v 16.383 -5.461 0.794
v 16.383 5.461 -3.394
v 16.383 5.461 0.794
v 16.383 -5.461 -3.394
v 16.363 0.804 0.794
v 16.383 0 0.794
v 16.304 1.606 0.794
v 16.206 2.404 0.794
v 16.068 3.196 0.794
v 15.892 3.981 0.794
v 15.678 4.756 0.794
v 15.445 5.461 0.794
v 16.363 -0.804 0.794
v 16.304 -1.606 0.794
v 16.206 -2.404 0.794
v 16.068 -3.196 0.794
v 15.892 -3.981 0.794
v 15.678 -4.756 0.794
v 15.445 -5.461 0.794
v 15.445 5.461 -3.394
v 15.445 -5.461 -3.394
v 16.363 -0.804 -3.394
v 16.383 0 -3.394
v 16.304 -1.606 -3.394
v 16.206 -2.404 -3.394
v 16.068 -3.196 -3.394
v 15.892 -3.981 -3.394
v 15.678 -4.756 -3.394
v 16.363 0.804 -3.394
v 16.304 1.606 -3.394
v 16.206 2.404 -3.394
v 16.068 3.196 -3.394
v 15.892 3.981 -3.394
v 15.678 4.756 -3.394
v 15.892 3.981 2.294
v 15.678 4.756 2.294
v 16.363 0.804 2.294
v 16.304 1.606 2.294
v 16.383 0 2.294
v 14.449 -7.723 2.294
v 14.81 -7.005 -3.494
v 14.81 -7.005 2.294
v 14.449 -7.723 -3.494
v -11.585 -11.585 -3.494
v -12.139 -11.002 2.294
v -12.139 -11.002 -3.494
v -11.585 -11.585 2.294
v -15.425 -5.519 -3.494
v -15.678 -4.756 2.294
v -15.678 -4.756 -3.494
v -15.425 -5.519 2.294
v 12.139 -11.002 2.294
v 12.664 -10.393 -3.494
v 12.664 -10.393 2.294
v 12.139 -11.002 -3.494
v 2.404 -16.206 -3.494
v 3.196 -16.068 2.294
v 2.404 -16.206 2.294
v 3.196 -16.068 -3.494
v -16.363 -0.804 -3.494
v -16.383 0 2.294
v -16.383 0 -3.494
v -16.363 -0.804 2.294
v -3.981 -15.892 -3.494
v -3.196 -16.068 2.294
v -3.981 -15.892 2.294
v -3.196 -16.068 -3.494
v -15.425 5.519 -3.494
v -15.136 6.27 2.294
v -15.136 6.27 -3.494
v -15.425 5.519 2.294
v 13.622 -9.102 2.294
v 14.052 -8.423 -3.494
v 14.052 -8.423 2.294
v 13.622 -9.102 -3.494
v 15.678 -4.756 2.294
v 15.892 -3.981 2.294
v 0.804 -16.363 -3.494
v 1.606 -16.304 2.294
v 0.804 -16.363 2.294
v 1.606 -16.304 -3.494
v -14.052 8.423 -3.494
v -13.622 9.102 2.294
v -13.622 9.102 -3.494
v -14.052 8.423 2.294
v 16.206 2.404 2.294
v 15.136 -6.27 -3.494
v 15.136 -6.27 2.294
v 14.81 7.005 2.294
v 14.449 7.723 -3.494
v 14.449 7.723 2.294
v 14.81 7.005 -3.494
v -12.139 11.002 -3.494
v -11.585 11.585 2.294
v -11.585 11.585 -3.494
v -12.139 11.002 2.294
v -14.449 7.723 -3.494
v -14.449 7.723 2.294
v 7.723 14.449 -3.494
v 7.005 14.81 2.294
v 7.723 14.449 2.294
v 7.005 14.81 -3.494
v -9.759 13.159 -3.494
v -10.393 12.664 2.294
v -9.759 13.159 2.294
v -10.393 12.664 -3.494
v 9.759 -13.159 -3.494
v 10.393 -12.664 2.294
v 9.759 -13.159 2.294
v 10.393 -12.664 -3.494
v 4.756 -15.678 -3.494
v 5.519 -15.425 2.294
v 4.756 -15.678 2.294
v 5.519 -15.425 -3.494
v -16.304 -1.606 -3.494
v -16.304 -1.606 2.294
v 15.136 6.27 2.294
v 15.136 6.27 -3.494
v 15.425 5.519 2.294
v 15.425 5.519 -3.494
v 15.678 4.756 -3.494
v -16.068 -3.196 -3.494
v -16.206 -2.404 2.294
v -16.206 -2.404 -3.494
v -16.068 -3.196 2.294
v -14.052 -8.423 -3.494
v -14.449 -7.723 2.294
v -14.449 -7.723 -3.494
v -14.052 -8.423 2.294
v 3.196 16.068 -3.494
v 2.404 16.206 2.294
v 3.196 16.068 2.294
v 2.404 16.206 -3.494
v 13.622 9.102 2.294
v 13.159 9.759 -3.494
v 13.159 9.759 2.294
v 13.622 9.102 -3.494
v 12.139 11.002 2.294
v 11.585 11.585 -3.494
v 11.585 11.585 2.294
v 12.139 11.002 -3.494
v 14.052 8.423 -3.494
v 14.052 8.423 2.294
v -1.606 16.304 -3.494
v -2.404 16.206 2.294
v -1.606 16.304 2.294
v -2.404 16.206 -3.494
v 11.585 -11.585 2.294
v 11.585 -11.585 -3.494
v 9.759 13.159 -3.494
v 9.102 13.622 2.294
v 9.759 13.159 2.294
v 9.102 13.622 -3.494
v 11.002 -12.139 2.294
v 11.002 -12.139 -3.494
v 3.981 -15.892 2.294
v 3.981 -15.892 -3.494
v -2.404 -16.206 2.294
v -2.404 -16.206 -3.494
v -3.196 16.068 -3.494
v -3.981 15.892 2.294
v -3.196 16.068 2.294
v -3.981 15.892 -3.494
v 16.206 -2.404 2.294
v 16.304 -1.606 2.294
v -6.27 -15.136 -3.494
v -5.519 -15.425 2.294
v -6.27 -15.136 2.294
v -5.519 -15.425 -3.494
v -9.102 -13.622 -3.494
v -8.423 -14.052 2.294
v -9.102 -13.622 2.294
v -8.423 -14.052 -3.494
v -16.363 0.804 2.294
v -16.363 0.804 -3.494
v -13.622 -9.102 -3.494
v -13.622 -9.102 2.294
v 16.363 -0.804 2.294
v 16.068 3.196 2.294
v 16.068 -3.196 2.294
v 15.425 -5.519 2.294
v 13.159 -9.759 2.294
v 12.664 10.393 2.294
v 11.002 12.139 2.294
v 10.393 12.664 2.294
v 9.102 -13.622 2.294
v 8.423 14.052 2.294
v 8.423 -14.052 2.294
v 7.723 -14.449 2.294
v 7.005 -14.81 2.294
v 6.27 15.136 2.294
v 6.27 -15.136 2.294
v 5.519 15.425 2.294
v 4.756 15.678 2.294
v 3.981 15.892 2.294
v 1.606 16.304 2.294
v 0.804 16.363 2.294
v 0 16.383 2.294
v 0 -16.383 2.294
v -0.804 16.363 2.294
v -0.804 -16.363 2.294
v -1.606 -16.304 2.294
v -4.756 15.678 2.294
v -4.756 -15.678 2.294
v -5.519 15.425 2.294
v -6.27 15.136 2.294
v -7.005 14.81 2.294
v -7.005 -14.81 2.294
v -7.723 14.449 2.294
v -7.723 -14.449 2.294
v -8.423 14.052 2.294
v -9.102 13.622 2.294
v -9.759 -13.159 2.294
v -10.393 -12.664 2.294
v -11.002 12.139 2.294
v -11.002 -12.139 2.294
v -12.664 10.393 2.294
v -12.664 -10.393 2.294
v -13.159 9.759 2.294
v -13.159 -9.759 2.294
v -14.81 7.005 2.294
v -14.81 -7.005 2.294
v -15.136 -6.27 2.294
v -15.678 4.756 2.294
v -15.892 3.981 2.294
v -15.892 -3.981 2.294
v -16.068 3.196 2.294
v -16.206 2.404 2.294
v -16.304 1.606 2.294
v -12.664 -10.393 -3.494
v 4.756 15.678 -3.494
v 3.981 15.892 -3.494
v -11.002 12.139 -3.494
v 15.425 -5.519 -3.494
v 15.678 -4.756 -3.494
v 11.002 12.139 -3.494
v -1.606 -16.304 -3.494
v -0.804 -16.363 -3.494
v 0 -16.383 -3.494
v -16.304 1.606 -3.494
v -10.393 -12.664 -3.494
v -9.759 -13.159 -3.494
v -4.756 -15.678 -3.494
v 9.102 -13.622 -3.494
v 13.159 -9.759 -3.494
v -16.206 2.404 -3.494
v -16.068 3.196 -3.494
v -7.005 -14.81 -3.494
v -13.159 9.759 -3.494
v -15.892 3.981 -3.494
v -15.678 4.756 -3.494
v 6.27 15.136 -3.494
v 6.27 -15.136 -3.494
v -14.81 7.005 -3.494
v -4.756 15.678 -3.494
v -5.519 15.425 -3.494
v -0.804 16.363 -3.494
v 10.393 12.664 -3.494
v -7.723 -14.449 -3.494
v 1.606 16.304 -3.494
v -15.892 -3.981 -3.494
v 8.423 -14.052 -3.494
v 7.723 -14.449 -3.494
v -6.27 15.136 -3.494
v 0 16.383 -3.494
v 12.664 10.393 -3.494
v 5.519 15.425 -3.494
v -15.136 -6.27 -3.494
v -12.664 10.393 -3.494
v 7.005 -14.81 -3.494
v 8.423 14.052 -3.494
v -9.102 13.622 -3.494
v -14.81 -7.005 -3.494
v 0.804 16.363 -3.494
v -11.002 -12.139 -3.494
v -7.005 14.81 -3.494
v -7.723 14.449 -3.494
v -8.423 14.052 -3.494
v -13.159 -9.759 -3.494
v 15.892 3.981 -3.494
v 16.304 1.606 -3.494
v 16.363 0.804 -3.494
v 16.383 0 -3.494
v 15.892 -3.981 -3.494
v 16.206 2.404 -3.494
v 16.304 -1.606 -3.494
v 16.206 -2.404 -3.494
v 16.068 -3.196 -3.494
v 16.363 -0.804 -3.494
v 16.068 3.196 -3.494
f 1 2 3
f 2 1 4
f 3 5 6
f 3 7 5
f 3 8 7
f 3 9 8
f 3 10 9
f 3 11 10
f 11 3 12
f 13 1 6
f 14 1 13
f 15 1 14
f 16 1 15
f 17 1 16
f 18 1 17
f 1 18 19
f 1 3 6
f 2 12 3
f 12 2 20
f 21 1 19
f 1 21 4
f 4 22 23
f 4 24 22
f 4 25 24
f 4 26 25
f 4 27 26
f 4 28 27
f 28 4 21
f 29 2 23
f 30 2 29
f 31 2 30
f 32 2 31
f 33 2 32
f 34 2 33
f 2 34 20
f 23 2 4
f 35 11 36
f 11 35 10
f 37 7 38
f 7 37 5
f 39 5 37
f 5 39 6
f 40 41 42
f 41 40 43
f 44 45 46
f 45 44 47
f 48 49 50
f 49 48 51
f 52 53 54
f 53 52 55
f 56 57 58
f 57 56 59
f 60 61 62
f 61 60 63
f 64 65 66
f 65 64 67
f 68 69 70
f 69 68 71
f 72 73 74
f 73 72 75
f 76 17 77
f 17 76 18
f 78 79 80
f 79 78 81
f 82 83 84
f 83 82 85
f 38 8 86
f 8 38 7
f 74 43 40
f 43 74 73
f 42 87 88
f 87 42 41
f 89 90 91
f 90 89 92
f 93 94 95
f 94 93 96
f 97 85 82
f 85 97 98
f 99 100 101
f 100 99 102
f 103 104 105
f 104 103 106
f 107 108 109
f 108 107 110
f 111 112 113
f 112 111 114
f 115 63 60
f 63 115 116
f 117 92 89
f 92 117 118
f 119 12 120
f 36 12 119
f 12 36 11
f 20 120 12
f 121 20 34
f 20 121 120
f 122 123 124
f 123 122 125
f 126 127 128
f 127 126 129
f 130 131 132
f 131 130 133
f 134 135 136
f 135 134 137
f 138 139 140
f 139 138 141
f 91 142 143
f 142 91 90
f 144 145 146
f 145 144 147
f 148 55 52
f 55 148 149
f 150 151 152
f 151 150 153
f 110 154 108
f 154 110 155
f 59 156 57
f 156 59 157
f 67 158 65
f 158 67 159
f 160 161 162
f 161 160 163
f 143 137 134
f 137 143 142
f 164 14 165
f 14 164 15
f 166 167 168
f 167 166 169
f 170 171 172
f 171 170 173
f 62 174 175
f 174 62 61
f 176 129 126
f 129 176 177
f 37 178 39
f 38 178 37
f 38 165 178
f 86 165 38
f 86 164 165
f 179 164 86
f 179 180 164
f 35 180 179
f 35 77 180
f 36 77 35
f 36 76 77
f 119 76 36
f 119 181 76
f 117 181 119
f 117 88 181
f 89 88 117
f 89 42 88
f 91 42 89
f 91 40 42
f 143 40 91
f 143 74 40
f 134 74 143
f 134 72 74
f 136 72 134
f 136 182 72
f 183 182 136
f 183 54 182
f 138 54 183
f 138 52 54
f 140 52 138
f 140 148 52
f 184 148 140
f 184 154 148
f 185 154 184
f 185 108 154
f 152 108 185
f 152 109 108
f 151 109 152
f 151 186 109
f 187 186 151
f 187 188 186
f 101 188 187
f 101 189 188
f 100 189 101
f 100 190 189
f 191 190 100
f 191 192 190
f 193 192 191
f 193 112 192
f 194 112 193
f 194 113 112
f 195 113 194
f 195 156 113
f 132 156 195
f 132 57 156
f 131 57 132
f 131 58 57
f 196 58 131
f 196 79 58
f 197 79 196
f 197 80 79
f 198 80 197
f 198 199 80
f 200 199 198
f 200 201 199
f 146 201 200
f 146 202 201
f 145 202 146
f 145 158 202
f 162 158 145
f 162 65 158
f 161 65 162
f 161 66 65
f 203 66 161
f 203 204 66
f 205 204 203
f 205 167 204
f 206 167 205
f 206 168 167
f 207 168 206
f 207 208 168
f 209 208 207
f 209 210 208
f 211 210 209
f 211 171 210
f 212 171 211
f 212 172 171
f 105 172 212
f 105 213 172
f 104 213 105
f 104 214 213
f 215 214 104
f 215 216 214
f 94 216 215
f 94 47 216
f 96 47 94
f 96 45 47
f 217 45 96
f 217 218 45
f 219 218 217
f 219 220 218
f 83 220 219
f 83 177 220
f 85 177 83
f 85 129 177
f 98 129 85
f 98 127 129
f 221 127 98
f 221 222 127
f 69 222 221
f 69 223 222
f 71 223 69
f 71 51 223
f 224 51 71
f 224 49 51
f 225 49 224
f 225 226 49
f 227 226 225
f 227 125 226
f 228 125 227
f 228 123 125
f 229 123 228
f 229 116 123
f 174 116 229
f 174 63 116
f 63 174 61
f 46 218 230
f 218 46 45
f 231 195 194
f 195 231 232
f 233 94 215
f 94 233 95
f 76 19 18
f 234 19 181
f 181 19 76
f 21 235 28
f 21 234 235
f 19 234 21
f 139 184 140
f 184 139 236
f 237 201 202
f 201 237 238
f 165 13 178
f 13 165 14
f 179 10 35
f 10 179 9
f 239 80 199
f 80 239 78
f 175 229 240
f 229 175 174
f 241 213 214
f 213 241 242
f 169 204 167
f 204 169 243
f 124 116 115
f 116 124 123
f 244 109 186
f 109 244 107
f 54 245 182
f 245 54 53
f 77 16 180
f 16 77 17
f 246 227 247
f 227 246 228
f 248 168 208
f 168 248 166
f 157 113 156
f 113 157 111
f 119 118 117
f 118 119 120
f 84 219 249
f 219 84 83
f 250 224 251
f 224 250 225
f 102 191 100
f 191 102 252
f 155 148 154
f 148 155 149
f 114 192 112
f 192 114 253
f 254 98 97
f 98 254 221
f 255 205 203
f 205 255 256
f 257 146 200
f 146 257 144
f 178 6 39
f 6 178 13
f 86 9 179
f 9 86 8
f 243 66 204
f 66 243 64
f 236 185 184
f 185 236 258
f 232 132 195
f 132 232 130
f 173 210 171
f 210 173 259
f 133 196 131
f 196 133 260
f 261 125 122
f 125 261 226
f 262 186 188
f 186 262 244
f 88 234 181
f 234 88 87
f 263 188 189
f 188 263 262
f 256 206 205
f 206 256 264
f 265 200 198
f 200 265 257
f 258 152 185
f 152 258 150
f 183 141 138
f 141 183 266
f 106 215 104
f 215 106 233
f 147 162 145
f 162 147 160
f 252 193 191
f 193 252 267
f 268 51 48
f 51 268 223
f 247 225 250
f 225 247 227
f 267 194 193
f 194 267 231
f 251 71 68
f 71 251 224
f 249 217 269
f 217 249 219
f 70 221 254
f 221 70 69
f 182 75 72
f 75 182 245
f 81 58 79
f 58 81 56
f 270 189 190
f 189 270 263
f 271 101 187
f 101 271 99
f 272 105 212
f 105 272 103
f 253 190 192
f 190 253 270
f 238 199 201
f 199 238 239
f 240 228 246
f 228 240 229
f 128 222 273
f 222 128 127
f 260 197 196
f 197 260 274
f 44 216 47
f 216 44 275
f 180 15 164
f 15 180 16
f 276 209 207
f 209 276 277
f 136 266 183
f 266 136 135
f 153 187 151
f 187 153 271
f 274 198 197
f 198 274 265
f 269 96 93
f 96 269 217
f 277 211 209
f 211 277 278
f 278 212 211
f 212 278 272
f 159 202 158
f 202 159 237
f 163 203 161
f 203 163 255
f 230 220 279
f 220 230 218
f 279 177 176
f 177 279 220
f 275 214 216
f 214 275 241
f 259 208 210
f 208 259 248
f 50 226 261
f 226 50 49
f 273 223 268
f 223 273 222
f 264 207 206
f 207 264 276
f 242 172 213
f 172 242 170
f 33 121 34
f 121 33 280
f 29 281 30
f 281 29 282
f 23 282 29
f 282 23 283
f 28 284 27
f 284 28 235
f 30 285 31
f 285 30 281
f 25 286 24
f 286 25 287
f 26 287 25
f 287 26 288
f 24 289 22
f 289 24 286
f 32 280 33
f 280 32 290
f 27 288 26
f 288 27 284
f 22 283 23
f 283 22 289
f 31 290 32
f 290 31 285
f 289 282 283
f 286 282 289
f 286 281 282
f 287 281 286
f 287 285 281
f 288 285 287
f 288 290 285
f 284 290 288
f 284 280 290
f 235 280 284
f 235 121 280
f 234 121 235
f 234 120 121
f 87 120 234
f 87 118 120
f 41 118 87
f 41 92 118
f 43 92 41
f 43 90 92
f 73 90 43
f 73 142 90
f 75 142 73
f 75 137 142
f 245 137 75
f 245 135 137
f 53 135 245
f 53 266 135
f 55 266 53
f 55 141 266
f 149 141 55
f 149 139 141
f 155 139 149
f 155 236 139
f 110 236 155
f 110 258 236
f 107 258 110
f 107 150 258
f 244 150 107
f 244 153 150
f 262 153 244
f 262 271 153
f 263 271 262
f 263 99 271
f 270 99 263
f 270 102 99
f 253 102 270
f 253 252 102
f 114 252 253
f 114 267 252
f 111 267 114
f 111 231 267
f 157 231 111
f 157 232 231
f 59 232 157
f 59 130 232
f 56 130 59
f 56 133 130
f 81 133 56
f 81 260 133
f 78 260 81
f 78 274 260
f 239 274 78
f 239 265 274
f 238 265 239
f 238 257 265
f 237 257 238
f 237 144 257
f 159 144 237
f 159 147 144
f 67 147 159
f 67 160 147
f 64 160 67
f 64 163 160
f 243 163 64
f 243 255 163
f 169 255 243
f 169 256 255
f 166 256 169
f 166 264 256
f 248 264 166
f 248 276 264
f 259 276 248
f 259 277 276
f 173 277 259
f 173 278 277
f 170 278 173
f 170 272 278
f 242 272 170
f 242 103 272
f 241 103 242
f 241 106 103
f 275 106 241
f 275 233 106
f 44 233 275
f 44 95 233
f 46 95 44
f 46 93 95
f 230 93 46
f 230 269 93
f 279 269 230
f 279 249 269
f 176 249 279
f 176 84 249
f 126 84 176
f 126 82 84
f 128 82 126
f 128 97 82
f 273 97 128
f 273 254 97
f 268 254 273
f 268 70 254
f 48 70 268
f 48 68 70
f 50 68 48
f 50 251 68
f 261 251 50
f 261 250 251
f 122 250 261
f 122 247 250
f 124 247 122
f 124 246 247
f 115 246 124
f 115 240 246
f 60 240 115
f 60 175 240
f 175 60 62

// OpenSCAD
inches = 25.4;
mm = 1;

pcb_diameter = 1.29 * inches;
pcb_thickness = 0.0625 * inches;
pcb_clearence_upper = 1.5 * mm;
pcb_clearence_lower = 2.7 * mm;
pcb_tab_edge_width = 0.045 * inches;
pcb_tab_edge_height = 0.43 * inches;
pcb_tab_clearence_upper = 0 * mm;
pcb_tab_clearence_lower = 2.6 * mm;

pcb_buffer = 0.2 * mm;

union()
{
    //main pcb thickness and keepout
    color([1, 0, 0]) translate([0, 0, pcb_clearence_upper/2+pcb_thickness/2]) cylinder(r=pcb_diameter/2, h=pcb_clearence_upper, $fn=128, center=true);
    color([0, 1, 0]) cylinder(r=pcb_diameter/2, h=pcb_thickness, $fn=128, center=true);
    color([1, 0, 0]) translate([0, 0, -pcb_clearence_lower/2-pcb_thickness/2]) cylinder(r=pcb_diameter/2, h=pcb_clearence_lower, $fn=128, center=true);
    //pcb tab thickness and keepout
    translate([pcb_diameter/2-pcb_tab_edge_width/2, 0, 0]) union()
    {
        color([1, 0, 0]) translate([0, 0, pcb_tab_clearence_upper/2+pcb_thickness/2]) cube(size=[pcb_tab_edge_width, pcb_tab_edge_height, pcb_tab_clearence_upper], center=true);
        color([0, 1, 0]) cube(size=[pcb_tab_edge_width, pcb_tab_edge_height, pcb_thickness], center=true);
        color([1, 0, 0]) translate([0, 0, -pcb_tab_clearence_lower/2-pcb_thickness/2]) cube(size=[pcb_tab_edge_width, pcb_tab_edge_height, pcb_tab_clearence_lower], center=true);
    }
}
